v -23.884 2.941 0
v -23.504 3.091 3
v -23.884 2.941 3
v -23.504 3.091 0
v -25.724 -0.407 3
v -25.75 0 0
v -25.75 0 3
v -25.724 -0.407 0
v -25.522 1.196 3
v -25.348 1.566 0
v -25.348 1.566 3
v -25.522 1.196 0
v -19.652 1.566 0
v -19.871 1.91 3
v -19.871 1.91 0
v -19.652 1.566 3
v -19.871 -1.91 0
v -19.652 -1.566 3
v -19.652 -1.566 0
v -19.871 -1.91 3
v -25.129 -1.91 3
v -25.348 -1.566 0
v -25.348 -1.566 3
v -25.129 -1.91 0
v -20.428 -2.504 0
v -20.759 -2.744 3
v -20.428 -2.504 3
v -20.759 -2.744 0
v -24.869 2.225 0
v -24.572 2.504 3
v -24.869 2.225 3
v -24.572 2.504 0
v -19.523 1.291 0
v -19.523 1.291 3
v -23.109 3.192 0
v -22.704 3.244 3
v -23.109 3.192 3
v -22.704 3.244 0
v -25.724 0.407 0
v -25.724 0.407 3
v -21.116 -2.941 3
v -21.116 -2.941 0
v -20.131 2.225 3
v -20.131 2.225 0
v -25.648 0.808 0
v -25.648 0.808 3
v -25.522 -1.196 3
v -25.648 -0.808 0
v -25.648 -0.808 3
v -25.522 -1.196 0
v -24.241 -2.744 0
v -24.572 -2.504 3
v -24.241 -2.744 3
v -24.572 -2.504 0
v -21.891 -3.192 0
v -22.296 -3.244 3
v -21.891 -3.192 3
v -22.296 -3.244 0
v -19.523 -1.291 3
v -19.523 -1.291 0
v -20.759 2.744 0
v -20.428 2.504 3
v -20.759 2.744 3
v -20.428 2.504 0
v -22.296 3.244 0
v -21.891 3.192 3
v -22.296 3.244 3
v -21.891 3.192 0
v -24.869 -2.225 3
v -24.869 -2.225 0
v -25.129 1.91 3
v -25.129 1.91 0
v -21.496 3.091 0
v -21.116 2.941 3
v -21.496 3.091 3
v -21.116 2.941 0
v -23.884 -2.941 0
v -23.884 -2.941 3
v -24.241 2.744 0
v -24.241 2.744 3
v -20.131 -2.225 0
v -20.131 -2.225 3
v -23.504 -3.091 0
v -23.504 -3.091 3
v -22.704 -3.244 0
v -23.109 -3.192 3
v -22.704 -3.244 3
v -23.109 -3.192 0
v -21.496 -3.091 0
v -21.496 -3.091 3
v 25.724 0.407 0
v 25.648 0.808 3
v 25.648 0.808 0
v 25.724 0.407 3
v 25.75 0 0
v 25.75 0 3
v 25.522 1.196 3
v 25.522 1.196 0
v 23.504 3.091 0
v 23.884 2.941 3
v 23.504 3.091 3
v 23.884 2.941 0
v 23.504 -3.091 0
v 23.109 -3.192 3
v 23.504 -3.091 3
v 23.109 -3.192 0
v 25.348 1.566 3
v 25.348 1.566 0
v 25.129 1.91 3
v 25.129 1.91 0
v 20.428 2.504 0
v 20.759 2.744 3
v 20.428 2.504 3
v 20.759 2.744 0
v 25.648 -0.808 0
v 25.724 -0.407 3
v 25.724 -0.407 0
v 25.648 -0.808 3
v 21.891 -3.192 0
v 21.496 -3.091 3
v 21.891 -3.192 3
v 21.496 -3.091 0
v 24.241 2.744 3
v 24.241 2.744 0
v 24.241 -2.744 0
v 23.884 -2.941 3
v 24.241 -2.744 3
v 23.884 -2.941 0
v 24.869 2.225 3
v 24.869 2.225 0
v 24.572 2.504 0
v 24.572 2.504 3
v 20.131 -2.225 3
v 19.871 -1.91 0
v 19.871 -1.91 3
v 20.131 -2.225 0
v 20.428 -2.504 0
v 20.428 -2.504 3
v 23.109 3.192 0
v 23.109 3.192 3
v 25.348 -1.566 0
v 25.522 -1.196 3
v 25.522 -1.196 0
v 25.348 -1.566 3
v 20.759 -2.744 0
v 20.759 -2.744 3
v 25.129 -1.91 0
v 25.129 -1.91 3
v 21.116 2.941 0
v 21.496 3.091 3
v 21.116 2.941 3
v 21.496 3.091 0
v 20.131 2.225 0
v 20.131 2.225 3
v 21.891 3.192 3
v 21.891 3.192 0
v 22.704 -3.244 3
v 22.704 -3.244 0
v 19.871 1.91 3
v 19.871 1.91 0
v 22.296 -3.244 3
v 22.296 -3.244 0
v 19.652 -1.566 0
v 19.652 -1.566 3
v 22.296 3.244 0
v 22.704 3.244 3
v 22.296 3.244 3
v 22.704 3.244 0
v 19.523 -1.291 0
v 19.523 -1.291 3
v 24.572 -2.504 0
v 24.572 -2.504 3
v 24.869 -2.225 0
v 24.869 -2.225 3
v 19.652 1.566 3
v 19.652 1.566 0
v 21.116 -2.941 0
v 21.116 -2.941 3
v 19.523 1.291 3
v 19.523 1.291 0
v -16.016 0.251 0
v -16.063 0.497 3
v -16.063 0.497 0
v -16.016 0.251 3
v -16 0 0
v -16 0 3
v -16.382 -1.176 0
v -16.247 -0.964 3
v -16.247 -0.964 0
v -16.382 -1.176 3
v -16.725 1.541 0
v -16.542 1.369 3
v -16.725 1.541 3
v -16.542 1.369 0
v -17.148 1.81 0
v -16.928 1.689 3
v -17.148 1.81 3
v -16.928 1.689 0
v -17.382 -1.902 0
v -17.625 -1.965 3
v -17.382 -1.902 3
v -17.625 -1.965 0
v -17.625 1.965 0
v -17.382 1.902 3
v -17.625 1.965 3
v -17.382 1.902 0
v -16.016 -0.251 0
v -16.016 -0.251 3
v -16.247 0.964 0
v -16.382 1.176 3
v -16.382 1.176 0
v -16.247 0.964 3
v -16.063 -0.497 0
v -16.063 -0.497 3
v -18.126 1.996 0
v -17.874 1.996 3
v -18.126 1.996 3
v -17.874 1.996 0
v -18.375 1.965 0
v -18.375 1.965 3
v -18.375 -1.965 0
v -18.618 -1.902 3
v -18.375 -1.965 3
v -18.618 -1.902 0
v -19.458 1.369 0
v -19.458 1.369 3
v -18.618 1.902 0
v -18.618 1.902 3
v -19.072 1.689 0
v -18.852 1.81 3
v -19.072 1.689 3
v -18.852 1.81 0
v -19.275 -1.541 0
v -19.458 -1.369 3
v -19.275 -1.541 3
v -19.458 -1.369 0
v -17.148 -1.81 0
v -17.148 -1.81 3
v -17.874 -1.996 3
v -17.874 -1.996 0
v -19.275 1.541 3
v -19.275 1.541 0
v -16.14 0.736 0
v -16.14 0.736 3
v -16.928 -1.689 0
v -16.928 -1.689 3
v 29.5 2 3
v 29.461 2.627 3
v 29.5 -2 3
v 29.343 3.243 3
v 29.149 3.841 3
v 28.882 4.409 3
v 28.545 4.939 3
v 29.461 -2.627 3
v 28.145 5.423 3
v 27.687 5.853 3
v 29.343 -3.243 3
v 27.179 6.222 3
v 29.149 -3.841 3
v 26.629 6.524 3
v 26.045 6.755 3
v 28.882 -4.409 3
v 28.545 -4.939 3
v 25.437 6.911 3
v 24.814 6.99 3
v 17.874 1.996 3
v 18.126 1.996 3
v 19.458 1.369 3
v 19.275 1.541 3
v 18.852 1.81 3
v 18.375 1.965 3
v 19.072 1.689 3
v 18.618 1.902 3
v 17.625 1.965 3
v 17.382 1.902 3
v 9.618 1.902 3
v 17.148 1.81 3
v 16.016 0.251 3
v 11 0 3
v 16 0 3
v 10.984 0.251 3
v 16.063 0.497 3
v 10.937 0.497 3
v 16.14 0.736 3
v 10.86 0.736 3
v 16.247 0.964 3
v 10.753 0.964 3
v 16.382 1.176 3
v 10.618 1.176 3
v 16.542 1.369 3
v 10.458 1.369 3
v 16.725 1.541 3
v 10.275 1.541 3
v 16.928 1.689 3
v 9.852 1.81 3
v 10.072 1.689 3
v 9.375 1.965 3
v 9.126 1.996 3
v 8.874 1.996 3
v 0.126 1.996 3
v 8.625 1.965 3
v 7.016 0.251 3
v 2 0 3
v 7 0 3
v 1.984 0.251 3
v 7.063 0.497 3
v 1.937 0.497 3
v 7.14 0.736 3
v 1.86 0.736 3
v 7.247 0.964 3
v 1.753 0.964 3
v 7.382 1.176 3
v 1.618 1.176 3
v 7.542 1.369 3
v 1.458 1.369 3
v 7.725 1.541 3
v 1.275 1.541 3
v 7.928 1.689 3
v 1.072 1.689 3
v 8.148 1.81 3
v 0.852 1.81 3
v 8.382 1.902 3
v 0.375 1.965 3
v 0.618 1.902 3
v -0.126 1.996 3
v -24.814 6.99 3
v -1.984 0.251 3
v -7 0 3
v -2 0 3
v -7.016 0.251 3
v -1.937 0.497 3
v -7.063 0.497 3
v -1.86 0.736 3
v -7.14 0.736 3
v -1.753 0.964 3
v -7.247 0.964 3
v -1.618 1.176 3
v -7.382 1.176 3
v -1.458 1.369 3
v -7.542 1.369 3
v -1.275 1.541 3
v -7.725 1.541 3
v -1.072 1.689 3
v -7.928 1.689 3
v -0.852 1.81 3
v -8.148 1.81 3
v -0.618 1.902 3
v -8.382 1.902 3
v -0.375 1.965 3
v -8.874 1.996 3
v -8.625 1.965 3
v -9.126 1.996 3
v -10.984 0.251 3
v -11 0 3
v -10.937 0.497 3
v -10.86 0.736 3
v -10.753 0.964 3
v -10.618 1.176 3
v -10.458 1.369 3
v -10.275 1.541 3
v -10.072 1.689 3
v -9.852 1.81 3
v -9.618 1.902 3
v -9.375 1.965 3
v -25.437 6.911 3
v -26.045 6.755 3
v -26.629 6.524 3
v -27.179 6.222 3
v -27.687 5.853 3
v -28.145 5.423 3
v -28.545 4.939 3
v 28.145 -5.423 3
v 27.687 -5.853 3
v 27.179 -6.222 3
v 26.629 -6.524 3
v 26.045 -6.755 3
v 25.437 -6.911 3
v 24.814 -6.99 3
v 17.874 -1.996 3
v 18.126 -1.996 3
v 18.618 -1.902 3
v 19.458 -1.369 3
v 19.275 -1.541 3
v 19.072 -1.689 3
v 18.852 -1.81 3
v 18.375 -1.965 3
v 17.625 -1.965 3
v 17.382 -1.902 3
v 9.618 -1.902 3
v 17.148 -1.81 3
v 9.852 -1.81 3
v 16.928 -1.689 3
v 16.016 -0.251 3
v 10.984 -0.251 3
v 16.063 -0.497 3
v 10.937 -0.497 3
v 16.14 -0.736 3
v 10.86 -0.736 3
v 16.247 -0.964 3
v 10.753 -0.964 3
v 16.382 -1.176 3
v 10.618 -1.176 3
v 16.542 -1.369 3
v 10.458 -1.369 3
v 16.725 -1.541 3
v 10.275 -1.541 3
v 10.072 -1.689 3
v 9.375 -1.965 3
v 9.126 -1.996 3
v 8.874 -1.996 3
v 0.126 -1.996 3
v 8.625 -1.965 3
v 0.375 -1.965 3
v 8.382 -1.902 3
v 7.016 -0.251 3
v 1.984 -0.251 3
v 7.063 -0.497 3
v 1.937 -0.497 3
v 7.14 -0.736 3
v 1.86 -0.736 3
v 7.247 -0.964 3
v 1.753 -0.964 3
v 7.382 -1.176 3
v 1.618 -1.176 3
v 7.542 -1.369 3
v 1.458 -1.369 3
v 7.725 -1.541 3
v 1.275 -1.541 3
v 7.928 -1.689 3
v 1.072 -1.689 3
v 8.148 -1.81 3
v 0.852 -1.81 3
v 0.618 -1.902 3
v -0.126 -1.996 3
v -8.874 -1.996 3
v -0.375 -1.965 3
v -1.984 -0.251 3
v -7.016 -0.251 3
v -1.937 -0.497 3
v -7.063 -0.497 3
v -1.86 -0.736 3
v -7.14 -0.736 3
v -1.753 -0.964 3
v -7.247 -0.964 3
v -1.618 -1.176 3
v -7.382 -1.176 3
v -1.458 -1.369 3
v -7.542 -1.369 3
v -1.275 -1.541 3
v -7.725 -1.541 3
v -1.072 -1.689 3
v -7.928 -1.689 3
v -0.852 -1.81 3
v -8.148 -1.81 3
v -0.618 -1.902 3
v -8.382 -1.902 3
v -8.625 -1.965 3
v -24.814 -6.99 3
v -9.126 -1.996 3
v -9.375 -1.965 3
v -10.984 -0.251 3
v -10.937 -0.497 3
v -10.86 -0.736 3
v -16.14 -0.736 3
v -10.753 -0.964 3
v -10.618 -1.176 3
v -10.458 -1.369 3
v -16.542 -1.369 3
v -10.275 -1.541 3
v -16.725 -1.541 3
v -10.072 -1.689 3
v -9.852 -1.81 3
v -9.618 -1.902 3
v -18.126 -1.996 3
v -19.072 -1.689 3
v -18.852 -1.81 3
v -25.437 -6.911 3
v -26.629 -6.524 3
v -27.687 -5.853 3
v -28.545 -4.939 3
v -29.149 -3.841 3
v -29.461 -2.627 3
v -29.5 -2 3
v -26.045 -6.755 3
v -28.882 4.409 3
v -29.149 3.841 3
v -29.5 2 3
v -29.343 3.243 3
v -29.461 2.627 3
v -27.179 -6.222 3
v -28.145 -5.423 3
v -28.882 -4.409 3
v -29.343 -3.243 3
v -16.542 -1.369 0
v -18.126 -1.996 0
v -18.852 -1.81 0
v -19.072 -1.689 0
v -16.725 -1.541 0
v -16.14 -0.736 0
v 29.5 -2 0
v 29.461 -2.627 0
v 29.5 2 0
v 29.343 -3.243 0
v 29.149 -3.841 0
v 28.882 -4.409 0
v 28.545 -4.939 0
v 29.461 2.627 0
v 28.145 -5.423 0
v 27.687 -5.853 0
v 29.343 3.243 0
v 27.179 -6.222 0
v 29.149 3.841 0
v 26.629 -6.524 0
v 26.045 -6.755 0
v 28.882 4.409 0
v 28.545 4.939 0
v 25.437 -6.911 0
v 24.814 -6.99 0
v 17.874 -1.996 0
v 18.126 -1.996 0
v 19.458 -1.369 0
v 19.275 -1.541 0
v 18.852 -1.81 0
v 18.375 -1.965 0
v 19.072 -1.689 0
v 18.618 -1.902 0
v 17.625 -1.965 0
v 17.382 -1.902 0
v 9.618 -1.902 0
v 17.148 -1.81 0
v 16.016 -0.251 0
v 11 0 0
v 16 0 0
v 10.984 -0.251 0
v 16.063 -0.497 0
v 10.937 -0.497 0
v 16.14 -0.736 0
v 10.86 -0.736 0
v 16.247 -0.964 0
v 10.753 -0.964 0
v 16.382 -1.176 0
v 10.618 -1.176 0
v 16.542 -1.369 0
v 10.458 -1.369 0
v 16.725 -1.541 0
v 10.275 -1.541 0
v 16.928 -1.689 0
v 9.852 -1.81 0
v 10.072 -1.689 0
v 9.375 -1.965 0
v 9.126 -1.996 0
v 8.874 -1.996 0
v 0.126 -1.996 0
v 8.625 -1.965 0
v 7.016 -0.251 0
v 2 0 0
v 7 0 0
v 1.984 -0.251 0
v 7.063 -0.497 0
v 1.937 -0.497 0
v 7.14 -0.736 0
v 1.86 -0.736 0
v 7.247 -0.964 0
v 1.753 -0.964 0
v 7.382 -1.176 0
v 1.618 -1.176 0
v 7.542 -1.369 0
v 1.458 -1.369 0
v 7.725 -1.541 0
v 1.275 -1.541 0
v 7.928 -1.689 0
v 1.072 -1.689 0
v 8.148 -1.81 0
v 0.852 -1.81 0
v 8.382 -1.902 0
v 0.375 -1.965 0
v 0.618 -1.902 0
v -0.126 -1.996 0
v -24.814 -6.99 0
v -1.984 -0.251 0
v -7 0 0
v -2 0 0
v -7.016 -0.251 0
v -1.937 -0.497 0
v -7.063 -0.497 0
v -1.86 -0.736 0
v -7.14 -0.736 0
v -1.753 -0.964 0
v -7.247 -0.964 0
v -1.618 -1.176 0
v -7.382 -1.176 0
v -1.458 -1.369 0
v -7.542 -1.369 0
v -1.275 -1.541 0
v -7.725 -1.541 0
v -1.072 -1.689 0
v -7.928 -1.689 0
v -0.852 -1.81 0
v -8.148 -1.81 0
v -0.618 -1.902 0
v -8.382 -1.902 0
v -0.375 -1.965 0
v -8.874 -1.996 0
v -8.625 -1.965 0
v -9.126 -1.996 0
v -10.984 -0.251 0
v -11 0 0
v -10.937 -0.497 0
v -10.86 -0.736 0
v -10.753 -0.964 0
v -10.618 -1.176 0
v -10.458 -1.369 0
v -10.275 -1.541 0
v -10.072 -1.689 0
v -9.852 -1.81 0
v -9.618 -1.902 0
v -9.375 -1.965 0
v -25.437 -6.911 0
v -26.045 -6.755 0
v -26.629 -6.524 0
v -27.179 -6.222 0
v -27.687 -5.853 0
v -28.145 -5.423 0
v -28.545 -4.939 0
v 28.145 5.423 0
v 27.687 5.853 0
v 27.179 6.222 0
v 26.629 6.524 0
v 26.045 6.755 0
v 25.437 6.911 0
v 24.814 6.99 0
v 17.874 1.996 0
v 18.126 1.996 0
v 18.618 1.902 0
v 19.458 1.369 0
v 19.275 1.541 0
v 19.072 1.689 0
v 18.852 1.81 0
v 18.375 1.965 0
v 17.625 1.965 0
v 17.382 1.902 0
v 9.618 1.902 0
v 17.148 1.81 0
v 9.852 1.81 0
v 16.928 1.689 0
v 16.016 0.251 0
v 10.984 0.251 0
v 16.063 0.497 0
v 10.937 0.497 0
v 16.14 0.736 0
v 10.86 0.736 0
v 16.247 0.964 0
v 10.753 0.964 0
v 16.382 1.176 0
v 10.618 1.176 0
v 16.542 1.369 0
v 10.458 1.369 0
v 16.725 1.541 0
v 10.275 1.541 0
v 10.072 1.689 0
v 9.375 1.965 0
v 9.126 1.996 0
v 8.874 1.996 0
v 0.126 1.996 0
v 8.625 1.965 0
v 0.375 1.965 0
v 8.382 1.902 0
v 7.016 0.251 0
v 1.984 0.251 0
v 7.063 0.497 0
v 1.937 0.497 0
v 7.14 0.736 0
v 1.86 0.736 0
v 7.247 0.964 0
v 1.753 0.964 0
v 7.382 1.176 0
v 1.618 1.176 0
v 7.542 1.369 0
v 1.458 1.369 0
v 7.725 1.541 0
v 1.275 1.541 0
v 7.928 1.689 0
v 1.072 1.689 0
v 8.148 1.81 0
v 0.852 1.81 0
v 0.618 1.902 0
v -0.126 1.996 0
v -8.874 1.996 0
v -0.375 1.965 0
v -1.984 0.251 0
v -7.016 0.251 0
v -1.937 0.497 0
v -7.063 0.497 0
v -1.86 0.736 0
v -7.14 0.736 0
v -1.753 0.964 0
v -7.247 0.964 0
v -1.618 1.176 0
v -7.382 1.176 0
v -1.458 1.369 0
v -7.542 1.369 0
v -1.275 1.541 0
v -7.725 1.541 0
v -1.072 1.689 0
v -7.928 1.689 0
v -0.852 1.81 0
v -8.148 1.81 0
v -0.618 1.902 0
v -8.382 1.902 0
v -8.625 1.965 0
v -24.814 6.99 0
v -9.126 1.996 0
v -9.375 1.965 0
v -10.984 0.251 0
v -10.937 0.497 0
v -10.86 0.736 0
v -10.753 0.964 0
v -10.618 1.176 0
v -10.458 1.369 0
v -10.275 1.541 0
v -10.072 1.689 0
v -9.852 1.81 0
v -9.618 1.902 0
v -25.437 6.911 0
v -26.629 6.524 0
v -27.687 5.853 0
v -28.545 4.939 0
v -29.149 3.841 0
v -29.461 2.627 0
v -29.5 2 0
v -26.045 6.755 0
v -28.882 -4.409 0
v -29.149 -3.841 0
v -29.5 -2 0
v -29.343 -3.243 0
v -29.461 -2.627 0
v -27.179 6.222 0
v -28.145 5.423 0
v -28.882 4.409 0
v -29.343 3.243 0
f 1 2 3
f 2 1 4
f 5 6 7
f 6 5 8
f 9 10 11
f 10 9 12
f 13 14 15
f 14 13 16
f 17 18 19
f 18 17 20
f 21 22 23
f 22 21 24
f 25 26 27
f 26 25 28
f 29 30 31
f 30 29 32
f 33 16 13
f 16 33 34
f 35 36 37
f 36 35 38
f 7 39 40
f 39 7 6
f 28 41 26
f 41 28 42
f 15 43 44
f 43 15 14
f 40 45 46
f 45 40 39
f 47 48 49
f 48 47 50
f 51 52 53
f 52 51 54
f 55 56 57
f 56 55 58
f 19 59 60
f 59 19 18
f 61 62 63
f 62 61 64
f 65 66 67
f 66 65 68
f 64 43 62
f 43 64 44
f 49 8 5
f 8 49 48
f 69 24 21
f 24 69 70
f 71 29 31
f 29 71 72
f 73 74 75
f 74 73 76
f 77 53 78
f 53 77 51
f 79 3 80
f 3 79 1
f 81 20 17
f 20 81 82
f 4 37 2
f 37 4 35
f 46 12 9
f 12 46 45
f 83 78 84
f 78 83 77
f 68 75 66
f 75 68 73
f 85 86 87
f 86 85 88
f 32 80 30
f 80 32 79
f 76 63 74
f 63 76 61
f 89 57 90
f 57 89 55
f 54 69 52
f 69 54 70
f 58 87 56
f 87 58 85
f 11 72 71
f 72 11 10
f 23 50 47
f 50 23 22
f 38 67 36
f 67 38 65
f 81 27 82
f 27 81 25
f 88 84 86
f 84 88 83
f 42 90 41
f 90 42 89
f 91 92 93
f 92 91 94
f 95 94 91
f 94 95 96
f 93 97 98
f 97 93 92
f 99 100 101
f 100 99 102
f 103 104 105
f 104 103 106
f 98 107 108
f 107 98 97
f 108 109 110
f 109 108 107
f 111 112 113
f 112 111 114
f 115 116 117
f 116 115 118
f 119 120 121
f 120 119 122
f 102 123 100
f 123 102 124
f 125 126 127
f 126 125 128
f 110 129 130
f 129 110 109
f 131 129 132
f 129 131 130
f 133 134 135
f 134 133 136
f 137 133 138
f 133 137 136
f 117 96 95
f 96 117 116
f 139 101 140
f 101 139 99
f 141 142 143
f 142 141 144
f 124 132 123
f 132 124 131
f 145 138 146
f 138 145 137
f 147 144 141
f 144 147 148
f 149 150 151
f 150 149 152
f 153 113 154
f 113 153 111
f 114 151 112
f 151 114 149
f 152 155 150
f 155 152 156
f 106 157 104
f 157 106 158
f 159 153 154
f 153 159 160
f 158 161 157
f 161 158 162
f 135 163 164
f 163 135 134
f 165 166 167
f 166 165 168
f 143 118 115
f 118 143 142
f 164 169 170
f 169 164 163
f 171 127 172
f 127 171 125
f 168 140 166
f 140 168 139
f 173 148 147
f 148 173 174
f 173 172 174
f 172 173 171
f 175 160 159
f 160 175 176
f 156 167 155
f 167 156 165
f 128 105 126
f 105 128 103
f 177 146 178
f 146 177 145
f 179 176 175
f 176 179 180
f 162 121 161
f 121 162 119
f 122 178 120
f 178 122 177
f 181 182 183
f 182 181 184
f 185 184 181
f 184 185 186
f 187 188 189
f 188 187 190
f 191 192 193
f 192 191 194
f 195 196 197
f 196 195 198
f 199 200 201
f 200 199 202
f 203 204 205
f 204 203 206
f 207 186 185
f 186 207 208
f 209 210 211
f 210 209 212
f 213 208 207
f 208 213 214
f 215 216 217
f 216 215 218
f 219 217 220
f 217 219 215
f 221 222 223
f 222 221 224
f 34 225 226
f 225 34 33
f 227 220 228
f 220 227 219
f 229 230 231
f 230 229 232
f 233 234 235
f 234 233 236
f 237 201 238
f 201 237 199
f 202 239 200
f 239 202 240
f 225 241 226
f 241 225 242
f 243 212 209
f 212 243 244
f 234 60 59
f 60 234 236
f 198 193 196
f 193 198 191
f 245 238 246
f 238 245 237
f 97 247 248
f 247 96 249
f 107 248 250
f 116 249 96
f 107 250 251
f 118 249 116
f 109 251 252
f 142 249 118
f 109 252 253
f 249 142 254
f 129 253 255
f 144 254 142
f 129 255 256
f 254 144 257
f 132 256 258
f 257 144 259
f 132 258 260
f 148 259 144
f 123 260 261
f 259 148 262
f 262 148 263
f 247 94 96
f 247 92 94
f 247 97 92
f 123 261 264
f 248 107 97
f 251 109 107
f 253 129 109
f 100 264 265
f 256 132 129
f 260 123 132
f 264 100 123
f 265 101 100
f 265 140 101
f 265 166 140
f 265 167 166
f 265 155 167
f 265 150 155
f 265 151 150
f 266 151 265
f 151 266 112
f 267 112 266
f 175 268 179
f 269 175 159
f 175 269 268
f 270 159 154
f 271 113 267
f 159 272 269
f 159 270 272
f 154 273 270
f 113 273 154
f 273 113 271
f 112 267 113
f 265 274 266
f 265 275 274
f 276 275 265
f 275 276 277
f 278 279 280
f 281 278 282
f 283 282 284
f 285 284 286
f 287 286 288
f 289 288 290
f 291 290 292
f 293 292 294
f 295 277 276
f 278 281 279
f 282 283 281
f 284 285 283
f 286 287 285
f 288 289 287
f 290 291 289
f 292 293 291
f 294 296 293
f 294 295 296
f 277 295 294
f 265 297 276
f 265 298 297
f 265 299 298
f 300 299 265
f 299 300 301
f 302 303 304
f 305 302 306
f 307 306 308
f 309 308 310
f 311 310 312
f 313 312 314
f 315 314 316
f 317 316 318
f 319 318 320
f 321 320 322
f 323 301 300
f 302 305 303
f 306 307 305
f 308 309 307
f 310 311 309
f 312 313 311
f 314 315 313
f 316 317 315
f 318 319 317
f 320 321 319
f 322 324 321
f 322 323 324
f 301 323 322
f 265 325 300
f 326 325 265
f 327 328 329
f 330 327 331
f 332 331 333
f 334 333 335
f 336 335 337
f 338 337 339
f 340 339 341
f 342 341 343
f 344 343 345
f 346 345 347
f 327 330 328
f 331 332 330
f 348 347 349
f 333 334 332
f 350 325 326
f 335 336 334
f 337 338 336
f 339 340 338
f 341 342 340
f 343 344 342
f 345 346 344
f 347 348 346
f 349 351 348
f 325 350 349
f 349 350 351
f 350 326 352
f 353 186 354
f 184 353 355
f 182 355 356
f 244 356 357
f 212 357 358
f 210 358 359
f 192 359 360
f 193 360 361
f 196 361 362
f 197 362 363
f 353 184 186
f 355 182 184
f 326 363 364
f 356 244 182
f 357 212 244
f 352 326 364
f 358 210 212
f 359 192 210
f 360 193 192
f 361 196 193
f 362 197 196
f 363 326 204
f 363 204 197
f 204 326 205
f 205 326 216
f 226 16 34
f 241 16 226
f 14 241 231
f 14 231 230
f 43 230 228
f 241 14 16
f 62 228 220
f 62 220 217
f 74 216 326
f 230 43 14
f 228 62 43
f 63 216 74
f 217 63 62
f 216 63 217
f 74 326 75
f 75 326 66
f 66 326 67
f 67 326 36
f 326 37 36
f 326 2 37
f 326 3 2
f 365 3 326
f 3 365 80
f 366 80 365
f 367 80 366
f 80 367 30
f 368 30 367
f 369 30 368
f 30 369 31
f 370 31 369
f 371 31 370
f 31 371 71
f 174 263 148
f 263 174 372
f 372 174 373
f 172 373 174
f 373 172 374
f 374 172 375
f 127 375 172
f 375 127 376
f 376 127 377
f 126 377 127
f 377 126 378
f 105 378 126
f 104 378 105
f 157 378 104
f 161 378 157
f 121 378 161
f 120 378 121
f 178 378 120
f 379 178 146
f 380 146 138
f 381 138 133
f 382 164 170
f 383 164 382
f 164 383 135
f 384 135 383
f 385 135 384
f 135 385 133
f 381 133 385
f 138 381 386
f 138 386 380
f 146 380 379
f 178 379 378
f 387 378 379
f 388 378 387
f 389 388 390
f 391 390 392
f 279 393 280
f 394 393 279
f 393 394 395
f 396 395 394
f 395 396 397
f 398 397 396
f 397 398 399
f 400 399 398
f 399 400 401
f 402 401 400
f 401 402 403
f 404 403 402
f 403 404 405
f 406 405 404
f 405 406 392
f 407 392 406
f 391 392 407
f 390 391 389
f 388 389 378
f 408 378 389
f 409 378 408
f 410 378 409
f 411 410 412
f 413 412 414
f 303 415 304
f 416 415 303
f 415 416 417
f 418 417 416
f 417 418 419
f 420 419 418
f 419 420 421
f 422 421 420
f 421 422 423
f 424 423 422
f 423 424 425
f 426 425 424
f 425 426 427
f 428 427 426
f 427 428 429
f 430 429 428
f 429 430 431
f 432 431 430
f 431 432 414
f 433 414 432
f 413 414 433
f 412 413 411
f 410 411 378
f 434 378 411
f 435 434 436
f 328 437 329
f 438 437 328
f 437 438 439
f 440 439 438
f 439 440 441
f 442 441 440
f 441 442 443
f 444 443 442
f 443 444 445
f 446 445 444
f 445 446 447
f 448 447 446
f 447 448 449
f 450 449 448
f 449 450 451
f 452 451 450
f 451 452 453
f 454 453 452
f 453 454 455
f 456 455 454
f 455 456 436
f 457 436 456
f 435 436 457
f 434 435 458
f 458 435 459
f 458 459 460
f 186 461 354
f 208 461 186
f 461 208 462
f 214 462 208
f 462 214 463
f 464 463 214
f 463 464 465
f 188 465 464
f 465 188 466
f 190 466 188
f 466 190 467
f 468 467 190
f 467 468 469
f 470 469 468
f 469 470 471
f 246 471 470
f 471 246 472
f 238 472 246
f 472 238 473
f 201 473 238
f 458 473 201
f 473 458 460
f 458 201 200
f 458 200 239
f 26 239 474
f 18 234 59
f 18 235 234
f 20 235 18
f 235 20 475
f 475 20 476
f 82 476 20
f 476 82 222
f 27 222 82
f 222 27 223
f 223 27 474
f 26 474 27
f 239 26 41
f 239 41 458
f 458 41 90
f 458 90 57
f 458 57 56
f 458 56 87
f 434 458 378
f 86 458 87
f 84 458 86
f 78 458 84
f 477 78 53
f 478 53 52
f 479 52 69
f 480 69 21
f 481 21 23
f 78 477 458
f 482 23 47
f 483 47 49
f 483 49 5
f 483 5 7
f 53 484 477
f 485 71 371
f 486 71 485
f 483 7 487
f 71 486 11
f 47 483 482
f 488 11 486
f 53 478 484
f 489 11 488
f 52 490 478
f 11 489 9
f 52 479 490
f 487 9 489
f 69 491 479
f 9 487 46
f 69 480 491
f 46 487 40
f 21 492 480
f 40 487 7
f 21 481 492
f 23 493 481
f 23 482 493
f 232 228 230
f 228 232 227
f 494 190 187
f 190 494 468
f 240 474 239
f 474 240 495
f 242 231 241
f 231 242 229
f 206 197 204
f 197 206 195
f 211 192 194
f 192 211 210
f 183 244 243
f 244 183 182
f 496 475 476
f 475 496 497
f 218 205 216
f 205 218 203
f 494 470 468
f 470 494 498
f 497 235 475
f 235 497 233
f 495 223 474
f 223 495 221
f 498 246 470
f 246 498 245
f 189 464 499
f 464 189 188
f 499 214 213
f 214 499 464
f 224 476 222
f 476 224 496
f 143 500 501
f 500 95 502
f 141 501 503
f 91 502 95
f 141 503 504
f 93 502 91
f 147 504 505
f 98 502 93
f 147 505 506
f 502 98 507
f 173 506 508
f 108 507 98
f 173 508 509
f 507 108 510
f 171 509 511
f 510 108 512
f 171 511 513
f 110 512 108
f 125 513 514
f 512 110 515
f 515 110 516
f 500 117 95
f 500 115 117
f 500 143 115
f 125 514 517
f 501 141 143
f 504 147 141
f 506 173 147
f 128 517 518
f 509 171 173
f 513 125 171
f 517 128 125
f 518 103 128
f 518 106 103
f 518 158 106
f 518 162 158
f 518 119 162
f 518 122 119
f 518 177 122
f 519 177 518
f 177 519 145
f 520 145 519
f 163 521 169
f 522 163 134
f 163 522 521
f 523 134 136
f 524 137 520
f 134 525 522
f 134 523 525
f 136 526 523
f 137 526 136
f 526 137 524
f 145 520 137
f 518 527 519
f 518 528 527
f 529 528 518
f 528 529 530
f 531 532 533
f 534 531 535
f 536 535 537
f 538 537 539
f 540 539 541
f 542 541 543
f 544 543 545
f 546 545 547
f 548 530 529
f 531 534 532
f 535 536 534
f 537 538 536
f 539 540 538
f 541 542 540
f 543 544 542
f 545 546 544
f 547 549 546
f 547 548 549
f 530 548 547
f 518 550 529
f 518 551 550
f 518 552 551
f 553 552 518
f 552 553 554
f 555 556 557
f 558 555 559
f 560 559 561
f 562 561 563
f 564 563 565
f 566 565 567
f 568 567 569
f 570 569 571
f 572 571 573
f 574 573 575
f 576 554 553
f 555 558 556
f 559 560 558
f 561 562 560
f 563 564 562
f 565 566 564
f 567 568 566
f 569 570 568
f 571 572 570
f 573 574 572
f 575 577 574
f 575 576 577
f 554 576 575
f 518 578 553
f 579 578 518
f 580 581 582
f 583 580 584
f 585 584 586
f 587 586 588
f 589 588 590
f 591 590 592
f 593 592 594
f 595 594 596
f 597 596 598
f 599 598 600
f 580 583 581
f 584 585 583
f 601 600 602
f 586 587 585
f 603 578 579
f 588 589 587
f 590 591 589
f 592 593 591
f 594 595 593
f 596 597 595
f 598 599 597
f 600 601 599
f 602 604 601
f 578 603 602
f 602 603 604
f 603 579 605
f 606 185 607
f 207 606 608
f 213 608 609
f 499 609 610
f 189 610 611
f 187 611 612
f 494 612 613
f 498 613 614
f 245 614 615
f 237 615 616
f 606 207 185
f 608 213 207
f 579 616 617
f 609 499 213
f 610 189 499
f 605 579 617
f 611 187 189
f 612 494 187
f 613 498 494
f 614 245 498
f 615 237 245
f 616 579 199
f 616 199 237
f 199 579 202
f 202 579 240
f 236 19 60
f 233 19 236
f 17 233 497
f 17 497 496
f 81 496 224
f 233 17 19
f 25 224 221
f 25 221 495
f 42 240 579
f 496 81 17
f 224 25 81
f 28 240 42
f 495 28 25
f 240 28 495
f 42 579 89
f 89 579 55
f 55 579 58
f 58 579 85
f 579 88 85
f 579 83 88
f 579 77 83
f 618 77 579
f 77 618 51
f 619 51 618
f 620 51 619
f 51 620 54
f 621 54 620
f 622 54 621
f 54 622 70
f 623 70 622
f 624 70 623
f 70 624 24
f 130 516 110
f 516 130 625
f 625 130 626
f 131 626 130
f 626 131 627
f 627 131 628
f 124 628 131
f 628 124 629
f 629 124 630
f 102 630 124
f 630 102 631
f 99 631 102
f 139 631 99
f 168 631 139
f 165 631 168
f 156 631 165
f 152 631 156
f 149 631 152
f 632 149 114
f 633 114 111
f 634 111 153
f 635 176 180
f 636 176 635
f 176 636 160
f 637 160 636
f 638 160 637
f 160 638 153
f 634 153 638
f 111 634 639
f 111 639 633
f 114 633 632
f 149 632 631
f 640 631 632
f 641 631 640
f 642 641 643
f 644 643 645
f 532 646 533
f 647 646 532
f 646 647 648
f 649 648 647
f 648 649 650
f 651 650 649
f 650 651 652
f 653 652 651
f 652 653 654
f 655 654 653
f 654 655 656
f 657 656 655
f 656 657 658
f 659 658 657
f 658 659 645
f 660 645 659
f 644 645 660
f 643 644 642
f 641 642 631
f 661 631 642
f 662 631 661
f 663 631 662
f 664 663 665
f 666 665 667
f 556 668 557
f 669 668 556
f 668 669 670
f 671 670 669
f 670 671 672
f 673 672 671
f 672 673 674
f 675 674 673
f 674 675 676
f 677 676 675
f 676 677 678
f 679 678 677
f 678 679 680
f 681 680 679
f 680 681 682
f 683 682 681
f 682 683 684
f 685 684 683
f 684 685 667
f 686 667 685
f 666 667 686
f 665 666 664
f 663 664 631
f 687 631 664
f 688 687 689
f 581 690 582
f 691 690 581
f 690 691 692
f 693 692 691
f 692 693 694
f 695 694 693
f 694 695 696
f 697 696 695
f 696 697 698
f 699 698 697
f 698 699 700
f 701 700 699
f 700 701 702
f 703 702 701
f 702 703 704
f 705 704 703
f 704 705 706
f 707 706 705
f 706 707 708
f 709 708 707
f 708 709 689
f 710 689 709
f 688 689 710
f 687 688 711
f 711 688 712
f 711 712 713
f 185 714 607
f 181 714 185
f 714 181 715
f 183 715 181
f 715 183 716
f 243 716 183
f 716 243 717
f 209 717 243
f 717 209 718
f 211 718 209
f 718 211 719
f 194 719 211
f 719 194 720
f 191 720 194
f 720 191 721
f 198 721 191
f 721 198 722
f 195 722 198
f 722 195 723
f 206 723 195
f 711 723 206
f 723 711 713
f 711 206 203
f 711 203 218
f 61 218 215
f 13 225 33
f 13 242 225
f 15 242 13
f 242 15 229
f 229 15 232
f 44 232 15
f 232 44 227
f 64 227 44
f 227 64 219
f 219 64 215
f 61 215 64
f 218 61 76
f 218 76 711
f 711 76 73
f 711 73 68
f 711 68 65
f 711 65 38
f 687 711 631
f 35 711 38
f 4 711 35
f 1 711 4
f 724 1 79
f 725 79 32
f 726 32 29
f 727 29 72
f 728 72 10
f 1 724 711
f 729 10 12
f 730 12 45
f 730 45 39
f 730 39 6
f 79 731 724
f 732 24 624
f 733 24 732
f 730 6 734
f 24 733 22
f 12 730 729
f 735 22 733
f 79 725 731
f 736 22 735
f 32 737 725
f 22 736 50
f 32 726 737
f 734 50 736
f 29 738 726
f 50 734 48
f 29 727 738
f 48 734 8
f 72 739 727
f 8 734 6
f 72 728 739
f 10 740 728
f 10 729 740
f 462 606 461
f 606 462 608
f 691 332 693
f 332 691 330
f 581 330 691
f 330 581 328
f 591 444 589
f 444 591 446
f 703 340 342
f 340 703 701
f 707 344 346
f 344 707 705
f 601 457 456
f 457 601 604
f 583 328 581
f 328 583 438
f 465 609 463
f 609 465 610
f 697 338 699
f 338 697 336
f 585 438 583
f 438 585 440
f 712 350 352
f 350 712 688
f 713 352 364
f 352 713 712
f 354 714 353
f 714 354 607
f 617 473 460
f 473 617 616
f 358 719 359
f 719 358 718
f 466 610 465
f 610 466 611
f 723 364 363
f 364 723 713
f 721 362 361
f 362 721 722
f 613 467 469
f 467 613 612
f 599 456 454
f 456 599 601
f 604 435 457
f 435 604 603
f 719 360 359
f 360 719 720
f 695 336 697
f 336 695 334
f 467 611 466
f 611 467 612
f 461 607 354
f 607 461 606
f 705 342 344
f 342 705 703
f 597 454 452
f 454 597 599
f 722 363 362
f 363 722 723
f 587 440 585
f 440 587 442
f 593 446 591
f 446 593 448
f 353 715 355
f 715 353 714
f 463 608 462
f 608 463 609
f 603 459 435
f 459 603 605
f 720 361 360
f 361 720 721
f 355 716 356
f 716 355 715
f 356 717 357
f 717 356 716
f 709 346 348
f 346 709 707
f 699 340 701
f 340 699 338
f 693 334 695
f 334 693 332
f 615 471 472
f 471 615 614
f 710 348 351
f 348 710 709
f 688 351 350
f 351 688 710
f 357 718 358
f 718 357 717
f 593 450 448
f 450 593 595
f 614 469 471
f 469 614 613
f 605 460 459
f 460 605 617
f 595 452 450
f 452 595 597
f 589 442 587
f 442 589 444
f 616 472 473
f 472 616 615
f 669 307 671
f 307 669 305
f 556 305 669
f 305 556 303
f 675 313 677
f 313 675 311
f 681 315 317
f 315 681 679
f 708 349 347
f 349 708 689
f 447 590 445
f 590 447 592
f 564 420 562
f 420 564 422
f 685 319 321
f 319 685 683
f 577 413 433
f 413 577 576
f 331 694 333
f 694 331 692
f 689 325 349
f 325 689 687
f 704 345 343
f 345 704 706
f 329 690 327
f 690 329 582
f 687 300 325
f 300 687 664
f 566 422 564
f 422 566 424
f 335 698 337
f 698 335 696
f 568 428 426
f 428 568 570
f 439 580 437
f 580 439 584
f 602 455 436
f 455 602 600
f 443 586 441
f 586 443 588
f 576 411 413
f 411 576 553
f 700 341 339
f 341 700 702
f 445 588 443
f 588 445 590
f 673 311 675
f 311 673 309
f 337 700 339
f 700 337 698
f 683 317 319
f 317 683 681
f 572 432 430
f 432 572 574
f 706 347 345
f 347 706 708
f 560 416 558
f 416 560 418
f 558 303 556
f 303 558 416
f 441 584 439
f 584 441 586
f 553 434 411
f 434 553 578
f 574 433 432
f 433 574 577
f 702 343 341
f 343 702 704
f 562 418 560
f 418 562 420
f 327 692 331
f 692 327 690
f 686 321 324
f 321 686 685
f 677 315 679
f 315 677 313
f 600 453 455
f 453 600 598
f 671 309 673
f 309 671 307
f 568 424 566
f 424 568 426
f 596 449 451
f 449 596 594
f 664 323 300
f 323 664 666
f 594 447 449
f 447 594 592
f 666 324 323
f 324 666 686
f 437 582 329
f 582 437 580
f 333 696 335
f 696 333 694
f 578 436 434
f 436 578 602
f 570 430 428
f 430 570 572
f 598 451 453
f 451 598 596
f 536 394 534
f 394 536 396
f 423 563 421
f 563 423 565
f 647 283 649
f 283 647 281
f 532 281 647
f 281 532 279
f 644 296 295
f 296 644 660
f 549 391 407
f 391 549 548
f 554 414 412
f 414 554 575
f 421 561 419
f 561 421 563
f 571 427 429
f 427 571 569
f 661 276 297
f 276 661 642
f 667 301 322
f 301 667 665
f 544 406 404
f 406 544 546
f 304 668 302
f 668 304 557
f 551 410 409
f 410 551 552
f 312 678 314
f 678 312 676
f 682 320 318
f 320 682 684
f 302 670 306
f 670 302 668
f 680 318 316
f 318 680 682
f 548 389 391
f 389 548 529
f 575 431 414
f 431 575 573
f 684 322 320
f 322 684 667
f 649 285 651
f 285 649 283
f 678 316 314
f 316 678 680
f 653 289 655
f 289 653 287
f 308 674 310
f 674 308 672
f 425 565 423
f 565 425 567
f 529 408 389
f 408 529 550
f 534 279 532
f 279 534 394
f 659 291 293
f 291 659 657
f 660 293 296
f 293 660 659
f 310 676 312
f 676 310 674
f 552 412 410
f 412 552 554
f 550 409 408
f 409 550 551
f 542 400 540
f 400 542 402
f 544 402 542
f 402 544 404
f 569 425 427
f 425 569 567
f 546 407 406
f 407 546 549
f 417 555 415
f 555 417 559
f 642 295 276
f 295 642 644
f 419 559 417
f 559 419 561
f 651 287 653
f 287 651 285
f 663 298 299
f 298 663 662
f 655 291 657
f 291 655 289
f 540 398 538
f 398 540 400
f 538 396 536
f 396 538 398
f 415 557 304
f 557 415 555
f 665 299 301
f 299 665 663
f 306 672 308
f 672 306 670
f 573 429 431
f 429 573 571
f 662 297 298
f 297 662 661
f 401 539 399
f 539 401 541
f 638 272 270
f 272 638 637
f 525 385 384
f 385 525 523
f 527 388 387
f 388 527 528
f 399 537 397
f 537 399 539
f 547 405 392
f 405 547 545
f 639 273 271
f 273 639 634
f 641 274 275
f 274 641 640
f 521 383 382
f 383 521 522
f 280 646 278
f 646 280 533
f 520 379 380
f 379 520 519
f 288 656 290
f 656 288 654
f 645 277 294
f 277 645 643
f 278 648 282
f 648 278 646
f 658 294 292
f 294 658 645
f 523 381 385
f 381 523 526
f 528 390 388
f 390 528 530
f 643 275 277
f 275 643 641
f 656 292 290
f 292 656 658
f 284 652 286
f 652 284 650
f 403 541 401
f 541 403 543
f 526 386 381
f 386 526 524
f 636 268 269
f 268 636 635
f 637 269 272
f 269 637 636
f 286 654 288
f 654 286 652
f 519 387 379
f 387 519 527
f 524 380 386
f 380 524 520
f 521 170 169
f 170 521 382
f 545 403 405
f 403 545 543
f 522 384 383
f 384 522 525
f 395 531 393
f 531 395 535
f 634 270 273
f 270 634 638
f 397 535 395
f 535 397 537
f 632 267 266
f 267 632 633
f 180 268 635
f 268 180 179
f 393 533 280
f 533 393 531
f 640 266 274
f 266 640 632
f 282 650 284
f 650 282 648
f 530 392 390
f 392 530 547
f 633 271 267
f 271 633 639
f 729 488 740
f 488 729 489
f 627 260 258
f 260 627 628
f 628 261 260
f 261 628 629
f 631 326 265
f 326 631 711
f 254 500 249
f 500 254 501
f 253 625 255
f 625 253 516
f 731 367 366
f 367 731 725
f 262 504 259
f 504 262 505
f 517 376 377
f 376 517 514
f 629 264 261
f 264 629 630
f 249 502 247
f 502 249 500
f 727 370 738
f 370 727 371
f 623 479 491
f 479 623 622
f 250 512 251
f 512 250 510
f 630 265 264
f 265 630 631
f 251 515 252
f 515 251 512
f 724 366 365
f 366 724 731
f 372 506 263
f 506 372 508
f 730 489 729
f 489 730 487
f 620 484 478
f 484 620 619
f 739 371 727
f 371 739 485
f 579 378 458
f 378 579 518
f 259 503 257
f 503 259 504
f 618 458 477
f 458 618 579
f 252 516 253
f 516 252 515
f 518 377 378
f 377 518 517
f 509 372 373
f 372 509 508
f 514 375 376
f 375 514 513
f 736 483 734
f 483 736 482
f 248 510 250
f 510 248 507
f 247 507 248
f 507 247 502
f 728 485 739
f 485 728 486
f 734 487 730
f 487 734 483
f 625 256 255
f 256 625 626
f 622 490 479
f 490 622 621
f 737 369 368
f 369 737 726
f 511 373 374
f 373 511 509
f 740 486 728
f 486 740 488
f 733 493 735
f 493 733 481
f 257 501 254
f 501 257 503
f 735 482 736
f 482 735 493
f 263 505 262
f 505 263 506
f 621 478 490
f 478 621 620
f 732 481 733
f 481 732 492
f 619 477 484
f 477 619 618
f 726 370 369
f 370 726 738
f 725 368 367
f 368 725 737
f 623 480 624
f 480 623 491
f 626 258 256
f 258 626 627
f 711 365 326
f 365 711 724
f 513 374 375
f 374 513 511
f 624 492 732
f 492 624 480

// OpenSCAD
$fn = 50;


difference() {
	union() {
		hull() {
			translate(v = [-24.5000000000, 2.0000000000, 0]) {
				cylinder(h = 3, r = 5);
			}
			translate(v = [24.5000000000, 2.0000000000, 0]) {
				cylinder(h = 3, r = 5);
			}
			translate(v = [-24.5000000000, -2.0000000000, 0]) {
				cylinder(h = 3, r = 5);
			}
			translate(v = [24.5000000000, -2.0000000000, 0]) {
				cylinder(h = 3, r = 5);
			}
		}
	}
	union() {
		#translate(v = [-22.5000000000, 0.0000000000, -100.0000000000]) {
			cylinder(h = 200, r = 3.2500000000);
		}
		#translate(v = [-22.5000000000, 0.0000000000, -100.0000000000]) {
			cylinder(h = 200, r = 3.2500000000);
		}
		#translate(v = [22.5000000000, 0.0000000000, -100.0000000000]) {
			cylinder(h = 200, r = 3.2500000000);
		}
		#translate(v = [22.5000000000, 0.0000000000, -100.0000000000]) {
			cylinder(h = 200, r = 3.2500000000);
		}
		#translate(v = [-18.0000000000, 0, 0]) {
			cylinder(h = 3, r = 2.0000000000);
		}
		#translate(v = [-9.0000000000, 0, 0]) {
			cylinder(h = 3, r = 2.0000000000);
		}
		#cylinder(h = 3, r = 2.0000000000);
		#translate(v = [9.0000000000, 0, 0]) {
			cylinder(h = 3, r = 2.0000000000);
		}
		#translate(v = [18.0000000000, 0, 0]) {
			cylinder(h = 3, r = 2.0000000000);
		}
	}
}
